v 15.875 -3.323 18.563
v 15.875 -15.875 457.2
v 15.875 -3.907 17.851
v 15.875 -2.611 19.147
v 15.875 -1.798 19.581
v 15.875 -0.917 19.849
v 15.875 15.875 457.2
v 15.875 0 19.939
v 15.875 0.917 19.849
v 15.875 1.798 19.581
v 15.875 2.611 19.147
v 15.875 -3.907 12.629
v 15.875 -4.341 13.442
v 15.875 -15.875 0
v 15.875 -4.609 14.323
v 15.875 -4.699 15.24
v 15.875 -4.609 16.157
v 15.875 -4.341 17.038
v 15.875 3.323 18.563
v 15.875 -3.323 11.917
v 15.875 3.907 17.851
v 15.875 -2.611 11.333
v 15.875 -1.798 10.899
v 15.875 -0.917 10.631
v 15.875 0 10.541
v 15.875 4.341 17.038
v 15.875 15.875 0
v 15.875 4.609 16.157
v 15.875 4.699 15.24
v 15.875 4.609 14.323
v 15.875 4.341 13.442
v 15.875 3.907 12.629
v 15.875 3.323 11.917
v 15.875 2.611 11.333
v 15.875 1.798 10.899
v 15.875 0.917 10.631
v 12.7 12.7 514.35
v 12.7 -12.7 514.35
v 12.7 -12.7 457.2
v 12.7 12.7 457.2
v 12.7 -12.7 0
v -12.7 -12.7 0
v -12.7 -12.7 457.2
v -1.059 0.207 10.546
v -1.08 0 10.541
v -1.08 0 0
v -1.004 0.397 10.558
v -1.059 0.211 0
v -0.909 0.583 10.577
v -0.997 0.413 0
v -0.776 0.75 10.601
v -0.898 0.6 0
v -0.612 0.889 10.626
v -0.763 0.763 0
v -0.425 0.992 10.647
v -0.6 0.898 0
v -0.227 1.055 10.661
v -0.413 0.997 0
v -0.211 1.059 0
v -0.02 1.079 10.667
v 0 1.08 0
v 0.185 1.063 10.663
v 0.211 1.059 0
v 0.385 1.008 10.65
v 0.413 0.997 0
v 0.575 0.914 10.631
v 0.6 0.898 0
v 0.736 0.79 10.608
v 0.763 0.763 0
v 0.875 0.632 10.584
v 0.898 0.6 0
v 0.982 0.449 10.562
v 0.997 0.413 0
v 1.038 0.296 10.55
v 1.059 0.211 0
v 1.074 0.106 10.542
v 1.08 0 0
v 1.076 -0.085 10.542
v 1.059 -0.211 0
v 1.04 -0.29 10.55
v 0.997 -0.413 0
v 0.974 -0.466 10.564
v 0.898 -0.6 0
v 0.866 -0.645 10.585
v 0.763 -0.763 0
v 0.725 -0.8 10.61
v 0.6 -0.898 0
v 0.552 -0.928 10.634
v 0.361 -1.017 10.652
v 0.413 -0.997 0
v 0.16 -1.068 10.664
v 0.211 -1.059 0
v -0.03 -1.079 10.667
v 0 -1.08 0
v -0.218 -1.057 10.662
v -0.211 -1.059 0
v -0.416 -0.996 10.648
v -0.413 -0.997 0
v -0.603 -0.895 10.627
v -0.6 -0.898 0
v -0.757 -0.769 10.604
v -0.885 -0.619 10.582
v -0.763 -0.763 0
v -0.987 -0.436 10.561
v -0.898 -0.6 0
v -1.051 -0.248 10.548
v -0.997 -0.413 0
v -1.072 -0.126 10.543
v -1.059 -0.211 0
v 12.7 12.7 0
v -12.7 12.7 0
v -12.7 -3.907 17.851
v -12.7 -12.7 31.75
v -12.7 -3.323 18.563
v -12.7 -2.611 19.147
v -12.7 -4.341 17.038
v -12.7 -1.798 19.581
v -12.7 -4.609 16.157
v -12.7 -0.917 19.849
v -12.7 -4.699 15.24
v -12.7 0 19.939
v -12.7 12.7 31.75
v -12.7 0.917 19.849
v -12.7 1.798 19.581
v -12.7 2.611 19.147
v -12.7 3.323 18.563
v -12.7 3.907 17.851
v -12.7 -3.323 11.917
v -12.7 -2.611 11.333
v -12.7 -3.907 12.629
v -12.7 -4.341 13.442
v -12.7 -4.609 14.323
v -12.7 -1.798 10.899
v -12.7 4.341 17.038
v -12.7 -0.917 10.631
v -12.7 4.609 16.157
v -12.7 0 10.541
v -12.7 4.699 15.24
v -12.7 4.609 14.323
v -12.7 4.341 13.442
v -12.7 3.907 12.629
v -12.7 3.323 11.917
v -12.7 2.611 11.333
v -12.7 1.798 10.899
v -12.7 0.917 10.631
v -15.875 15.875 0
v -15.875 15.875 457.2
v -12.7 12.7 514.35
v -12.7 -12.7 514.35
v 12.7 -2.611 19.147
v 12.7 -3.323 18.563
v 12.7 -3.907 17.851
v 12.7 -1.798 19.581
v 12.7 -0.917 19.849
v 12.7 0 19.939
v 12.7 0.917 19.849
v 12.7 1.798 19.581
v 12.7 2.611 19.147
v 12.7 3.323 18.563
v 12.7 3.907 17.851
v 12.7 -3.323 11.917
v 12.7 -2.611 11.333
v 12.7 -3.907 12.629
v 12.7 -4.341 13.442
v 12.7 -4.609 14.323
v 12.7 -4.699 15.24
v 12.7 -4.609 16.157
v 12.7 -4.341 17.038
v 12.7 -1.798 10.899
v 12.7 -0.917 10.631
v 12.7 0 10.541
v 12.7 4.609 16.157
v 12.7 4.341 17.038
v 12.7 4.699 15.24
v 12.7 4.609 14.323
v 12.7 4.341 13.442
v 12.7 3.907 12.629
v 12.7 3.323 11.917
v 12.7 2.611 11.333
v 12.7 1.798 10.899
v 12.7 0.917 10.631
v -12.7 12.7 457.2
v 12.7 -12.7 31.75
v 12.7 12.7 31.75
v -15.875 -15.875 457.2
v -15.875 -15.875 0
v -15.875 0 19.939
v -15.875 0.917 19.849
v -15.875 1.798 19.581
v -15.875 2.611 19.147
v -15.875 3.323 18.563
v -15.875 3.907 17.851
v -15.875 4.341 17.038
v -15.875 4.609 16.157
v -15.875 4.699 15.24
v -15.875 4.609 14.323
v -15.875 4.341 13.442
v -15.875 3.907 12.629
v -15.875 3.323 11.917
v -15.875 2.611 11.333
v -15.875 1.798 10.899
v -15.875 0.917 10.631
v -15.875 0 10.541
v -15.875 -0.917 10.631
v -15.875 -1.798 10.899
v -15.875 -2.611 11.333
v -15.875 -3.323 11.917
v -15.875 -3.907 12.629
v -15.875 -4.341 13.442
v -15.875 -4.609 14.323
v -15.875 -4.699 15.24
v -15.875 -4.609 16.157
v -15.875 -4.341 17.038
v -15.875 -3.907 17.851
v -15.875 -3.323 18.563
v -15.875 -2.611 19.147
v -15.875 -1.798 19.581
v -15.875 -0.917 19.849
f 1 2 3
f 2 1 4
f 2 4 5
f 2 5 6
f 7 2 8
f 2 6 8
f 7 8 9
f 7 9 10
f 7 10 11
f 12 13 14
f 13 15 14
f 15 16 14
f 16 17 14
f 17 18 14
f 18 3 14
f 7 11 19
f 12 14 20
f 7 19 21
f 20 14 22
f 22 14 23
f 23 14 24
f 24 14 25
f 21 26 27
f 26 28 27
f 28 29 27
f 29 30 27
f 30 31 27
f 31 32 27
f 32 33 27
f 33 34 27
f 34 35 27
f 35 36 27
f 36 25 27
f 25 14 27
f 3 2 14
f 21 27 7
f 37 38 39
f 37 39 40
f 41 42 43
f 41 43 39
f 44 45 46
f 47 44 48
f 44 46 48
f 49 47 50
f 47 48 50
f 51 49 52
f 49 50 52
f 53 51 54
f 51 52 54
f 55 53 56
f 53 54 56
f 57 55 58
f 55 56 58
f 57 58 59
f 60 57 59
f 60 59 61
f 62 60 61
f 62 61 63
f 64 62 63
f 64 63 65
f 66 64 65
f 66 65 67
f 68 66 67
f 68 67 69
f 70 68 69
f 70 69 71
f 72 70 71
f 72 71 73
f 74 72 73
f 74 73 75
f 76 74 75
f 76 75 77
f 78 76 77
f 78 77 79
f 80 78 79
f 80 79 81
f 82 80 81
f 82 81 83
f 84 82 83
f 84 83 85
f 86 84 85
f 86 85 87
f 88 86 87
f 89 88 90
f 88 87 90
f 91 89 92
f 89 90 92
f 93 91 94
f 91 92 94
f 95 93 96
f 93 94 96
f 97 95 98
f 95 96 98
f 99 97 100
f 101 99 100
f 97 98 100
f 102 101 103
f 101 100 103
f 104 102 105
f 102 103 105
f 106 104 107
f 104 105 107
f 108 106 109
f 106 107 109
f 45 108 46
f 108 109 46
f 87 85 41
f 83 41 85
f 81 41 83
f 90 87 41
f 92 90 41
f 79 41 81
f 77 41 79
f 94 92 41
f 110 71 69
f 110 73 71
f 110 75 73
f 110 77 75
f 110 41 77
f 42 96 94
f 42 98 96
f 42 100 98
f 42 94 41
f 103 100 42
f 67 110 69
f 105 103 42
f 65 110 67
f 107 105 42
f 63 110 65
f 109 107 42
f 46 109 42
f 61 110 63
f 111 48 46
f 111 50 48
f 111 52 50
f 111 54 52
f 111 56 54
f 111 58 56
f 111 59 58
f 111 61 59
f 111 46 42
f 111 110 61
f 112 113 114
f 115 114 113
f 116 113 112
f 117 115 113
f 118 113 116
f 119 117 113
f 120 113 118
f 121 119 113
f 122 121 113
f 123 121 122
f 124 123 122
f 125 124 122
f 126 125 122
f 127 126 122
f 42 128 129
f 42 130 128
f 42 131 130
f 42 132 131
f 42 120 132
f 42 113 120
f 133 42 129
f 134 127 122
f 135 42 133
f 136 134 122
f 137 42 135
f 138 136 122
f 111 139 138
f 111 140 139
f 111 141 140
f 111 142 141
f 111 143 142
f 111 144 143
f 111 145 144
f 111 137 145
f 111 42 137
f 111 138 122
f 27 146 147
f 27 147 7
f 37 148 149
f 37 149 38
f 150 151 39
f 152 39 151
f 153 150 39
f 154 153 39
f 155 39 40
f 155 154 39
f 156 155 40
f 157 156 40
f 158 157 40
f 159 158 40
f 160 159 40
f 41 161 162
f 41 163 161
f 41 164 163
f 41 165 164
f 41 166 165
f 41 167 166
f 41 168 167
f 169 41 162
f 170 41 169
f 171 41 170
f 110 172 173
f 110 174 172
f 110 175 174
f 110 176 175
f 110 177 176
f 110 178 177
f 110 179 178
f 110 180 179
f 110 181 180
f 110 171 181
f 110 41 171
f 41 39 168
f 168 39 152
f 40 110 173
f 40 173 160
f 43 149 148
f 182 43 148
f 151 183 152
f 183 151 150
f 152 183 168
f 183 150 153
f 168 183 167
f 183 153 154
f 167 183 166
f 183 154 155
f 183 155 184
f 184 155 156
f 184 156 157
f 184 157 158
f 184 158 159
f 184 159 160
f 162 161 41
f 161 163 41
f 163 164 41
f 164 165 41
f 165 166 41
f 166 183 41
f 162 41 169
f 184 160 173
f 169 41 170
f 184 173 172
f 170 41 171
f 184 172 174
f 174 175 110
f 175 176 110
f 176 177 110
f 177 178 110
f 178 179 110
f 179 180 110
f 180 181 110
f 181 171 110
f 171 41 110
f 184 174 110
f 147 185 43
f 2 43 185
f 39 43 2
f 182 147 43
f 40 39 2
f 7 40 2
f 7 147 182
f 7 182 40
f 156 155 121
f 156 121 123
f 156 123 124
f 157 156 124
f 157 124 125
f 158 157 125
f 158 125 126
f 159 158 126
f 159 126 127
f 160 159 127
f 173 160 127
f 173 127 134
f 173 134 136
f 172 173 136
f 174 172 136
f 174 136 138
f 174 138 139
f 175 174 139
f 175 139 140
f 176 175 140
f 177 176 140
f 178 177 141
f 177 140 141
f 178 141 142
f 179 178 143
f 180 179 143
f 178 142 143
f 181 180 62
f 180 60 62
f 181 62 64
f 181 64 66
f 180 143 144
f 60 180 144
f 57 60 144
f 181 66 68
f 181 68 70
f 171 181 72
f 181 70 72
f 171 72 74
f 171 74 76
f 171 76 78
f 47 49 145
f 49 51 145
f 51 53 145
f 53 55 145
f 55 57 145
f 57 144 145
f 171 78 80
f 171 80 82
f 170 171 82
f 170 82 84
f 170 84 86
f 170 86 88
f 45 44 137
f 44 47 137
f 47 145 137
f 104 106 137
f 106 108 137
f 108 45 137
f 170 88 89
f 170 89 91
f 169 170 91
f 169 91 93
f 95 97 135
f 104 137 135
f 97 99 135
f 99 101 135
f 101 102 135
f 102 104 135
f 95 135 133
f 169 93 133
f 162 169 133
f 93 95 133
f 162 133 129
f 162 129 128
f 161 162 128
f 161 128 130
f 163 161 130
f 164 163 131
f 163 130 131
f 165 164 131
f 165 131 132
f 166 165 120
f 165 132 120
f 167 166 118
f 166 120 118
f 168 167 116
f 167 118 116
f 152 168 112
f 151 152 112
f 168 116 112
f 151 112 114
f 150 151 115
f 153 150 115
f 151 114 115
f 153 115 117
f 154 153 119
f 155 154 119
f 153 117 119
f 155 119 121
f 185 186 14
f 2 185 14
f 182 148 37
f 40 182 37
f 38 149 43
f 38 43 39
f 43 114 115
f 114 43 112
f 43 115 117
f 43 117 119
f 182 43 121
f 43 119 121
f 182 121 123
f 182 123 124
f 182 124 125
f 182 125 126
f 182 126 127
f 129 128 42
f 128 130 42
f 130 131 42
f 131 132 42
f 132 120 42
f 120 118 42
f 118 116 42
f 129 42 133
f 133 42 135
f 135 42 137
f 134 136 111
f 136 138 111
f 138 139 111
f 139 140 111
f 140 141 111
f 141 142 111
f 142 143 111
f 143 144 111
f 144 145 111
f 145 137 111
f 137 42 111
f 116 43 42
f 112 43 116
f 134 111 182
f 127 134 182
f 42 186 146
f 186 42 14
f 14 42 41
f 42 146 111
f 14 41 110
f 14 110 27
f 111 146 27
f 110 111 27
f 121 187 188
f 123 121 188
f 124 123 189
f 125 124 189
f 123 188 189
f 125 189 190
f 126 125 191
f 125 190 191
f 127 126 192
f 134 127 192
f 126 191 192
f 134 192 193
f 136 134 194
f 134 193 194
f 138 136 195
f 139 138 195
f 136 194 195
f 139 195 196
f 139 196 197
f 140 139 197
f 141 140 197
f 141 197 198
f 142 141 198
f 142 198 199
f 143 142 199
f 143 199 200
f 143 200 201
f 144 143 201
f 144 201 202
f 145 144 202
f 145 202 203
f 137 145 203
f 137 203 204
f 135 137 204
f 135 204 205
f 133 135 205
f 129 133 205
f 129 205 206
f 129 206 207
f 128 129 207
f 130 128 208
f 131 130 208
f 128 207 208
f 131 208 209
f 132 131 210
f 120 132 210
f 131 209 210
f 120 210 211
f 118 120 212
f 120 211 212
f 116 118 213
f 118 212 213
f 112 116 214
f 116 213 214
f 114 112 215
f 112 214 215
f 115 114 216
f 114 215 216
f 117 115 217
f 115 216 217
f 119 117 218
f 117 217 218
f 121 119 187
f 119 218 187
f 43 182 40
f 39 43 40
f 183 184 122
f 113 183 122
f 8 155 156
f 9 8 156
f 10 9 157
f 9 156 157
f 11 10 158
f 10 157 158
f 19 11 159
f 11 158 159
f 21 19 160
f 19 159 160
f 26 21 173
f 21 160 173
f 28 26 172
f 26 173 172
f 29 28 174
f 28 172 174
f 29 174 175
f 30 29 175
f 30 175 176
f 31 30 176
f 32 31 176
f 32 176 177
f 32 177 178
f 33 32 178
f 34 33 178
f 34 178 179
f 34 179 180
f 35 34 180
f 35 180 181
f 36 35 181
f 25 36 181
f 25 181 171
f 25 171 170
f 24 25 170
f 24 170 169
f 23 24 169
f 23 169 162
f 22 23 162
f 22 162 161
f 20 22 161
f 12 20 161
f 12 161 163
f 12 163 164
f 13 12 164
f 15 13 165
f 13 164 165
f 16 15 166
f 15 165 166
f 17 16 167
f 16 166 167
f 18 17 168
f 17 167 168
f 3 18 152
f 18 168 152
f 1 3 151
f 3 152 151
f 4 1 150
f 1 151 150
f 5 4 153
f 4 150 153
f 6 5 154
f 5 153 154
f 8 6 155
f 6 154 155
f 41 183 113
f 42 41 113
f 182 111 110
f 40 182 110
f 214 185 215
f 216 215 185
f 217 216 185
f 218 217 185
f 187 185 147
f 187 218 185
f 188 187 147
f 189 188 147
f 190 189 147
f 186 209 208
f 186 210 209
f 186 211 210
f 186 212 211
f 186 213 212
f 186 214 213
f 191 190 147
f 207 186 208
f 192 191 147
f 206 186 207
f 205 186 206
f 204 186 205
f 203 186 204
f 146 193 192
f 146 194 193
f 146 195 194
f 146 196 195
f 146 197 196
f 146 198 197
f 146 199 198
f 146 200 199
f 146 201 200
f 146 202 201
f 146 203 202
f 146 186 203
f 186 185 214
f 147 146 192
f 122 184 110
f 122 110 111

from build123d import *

# Parameters (mm, degrees)
SKETCH1_W          = 31.75
SKETCH1_H          = 31.75
SKETCH1_W_2        = 25.4
SKETCH1_H_2        = 25.4
EXTRUDE1_DEPTH     = 457.2
SKETCH2_W          = 25.4
SKETCH2_H          = 25.4
EXTRUDE2_DEPTH     = 57.15
SKETCH4_W          = 25.4
SKETCH4_H          = 25.4
EXTRUDE4_DEPTH     = 31.75
SKETCH3_R          = 4.699
CUT_EXTRUDE3_DEPTH = 32.75
SKETCH5_R          = 1.0795
CUT_EXTRUDE4_DEPTH = 15.24


with BuildPart() as part:
    # Sketch1 → Extrude1 (new body)
    with BuildSketch(Plane.XY):
        Rectangle(SKETCH1_W, SKETCH1_H)
        Rectangle(SKETCH1_W_2, SKETCH1_H_2, mode=Mode.SUBTRACT)
    extrude(amount=EXTRUDE1_DEPTH)


with BuildPart() as body_2:
    # Sketch2 → Extrude2 (new body)
    with BuildSketch(Plane.XY.offset(457.2)):
        Rectangle(SKETCH2_W, SKETCH2_H)
    extrude(amount=EXTRUDE2_DEPTH)


with BuildPart() as body_3:
    # Sketch4 → Extrude4 (new body)
    with BuildSketch(Plane(origin=(0, 0, 0), x_dir=(-1, 0, 0), z_dir=(0, 0, -1))):
        Rectangle(SKETCH4_W, SKETCH4_H)
    extrude(amount=-EXTRUDE4_DEPTH)


with BuildPart() as cut_extrude3_tool:
    # Sketch3 → Cut-Extrude3 (new body, through all)
    with BuildSketch(Plane.ZY.offset(15.875)):
        with Locations((15.24, 0)):
            Circle(SKETCH3_R)
    extrude(amount=-CUT_EXTRUDE3_DEPTH)


with BuildPart() as part_1:
    add(part.part)

    # Cut-Extrude3: cut by cut_extrude3_tool
    add(cut_extrude3_tool.part, mode=Mode.SUBTRACT)


with BuildPart() as body_3_1:
    add(body_3.part)

    # Cut-Extrude3: cut by cut_extrude3_tool
    add(cut_extrude3_tool.part, mode=Mode.SUBTRACT)

    # Sketch5 → Cut-Extrude4 (cut)
    with BuildSketch(Plane(origin=(0, 0, 0), x_dir=(-1, 0, 0), z_dir=(0, 0, -1))):
        Circle(SKETCH5_R)
    extrude(amount=-CUT_EXTRUDE4_DEPTH, mode=Mode.SUBTRACT)


solid = Compound([body_2.part, part_1.part, body_3_1.part])
